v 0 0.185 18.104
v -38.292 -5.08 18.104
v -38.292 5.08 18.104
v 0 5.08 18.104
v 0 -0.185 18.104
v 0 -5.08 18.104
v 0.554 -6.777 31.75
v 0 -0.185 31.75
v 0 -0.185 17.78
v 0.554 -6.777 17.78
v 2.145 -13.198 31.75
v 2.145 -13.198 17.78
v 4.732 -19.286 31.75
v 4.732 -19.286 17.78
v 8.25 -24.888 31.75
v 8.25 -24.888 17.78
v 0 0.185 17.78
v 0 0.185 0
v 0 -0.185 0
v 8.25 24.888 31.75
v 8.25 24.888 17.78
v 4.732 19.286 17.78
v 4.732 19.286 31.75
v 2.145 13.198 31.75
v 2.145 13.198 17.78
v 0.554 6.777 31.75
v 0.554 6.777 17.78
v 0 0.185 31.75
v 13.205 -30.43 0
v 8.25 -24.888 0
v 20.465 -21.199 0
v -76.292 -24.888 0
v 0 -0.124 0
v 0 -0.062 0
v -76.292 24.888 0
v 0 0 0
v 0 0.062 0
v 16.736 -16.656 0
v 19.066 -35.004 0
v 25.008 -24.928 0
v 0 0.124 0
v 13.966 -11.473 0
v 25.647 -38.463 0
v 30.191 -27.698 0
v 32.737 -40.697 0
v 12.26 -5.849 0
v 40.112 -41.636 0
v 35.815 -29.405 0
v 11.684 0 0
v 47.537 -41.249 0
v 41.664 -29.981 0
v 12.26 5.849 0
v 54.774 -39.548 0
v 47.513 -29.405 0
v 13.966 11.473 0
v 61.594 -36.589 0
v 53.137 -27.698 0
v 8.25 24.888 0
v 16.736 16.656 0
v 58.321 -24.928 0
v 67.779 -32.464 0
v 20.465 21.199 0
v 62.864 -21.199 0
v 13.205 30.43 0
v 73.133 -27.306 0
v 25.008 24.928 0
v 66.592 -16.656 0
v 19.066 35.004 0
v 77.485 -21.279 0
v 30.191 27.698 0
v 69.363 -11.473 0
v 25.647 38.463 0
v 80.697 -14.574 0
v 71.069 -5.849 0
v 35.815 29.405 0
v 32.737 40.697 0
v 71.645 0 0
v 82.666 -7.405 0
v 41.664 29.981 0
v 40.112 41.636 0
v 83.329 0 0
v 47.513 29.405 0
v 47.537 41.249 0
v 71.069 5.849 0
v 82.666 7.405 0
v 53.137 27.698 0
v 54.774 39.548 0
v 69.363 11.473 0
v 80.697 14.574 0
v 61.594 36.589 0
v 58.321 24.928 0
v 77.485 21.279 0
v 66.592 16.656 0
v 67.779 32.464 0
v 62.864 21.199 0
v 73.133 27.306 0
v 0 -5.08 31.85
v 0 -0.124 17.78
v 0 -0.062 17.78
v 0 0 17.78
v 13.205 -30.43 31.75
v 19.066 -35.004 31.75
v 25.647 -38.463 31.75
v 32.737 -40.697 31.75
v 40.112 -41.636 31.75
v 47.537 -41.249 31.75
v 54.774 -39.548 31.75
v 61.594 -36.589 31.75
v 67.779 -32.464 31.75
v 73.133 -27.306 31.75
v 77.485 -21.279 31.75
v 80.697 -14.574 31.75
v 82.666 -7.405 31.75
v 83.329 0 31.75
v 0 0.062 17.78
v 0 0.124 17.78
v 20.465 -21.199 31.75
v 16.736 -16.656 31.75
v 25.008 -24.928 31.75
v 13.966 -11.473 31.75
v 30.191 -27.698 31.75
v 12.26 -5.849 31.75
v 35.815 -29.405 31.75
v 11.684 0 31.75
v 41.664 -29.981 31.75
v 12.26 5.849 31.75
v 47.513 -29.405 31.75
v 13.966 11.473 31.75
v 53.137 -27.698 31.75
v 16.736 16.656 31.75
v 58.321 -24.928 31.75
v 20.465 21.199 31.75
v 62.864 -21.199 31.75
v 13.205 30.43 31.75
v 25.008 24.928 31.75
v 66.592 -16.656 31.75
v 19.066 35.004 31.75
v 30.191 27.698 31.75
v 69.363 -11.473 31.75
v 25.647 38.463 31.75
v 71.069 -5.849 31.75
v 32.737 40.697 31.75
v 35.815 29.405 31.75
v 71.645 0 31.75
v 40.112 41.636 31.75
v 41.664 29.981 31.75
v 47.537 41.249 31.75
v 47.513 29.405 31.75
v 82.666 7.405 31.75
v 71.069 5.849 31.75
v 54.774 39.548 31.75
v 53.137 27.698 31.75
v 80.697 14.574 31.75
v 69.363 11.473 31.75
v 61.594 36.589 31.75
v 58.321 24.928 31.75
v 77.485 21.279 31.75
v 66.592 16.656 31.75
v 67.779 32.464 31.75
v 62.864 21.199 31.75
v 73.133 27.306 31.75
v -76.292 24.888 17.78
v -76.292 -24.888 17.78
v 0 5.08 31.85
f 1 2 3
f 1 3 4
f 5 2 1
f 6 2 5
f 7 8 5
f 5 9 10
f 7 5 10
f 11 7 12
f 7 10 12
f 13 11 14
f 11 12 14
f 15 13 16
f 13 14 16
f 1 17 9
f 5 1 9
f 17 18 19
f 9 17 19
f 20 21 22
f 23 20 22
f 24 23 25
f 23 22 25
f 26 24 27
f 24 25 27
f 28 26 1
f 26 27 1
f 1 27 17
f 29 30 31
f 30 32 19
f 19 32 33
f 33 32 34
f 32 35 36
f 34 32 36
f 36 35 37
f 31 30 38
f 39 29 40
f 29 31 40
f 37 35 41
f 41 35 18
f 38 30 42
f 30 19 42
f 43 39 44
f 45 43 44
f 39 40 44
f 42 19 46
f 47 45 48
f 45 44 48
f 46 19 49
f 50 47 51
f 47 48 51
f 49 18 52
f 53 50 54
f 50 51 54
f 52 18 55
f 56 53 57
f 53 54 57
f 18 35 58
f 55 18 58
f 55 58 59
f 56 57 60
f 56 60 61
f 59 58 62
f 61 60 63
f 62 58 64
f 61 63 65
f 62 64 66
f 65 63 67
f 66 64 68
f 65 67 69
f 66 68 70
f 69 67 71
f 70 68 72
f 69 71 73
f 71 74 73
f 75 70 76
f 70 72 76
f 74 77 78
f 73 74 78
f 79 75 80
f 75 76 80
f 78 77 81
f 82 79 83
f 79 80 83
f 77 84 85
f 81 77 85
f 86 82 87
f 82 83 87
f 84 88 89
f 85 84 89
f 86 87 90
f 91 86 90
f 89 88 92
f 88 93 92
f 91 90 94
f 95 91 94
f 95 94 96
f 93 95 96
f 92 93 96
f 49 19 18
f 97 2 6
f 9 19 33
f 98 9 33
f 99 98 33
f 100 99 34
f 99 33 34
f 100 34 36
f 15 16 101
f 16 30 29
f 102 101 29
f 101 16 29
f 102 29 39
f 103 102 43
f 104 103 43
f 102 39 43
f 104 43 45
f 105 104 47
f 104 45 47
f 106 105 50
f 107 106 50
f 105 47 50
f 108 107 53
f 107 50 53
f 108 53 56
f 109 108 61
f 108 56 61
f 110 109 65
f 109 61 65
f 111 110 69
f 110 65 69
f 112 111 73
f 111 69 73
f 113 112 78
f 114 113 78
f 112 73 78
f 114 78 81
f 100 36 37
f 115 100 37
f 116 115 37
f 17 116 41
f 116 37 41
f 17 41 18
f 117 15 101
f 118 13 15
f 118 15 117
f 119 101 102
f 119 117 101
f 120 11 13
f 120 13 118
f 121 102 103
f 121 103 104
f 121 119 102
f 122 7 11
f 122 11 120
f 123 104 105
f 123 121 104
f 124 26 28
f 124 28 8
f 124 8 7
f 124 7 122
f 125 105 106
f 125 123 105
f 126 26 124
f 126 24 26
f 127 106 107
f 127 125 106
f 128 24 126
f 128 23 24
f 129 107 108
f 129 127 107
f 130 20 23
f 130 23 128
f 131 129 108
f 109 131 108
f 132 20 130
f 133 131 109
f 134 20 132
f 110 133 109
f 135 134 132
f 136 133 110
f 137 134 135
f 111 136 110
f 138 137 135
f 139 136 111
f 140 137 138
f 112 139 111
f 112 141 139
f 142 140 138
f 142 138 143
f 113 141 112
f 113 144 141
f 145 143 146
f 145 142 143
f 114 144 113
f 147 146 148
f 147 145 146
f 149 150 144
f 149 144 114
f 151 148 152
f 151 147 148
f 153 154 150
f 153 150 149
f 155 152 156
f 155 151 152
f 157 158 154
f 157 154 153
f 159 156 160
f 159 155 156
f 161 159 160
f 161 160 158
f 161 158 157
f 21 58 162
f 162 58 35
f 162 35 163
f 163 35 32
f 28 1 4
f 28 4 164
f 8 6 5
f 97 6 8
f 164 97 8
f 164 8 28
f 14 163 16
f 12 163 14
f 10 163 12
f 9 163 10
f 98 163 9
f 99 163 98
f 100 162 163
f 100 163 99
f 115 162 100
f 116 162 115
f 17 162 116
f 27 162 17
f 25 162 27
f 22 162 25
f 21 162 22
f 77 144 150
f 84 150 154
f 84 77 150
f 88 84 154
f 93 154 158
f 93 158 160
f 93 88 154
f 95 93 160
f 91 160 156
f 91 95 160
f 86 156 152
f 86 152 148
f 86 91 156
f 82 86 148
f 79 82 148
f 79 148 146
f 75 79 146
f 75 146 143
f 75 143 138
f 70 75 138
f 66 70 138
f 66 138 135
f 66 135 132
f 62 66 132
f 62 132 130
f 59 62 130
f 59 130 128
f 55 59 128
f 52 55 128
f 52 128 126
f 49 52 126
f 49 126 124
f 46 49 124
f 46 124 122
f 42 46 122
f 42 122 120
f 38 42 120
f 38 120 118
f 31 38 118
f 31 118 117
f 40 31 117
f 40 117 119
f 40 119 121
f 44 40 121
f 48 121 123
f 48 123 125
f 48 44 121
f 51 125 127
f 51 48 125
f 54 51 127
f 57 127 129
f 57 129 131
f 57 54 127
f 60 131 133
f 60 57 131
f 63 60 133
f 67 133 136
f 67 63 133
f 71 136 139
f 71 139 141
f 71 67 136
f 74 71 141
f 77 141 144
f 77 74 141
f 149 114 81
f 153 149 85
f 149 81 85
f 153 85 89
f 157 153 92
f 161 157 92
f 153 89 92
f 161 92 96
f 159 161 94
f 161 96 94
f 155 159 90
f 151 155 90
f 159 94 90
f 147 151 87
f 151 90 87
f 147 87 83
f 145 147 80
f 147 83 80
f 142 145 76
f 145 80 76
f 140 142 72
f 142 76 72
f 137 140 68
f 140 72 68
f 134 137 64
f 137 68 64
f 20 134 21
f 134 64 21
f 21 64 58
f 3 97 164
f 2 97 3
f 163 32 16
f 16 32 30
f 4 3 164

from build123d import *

# Parameters (mm, degrees)
F0_R     = 29.980607
F1_DEPTH = 31.75
F2_DEPTH = 17.78
F4_DEPTH = 5.08


with BuildPart() as f1:
    # F0 (on Top) → F1 (new body)
    with BuildSketch(Plane.XY):
        with BuildLine():
            ThreePointArc((8.249651, -24.887905), (54.774032, -39.548346), (83.328802, 0))
            ThreePointArc((83.328802, 0), (54.774032, 39.548346), (8.249651, 24.887905))
            ThreePointArc((8.249651, 24.887905), (2.145128, 13.197838), (0, 0.185486))
            Line((0, 0.185486), (0, 0))
            Line((0, 0), (0, -0.185486))
            ThreePointArc((0, -0.185486), (2.145128, -13.197838), (8.249651, -24.887905))
        make_face()
        with Locations((41.664194, 0)):
            Circle(F0_R, mode=Mode.SUBTRACT)
    extrude(amount=F1_DEPTH)

    # F0 (on Top) → F2 (join)
    with BuildSketch(Plane.XY):
        with BuildLine():
            ThreePointArc((8.249651, -24.887905), (54.774032, -39.548346), (83.328802, 0))
            ThreePointArc((83.328802, 0), (54.774032, 39.548346), (8.249651, 24.887905))
            ThreePointArc((8.249651, 24.887905), (2.145128, 13.197838), (0, 0.185486))
            Line((0, 0.185486), (0, 0))
            Line((0, 0), (0, -0.185486))
            ThreePointArc((0, -0.185486), (2.145128, -13.197838), (8.249651, -24.887905))
        make_face()
        with Locations((41.664194, 0)):
            Circle(F0_R, mode=Mode.SUBTRACT)
        with BuildLine():
            ThreePointArc((0, 0.185486), (2.145128, 13.197838), (8.249651, 24.887905))
            Line((8.249651, 24.887905), (0, 24.887905))
            Line((0, 24.887905), (0, 0.185486))
        make_face()
        with BuildLine():
            Line((0, -24.887905), (8.249651, -24.887905))
            ThreePointArc((8.249651, -24.887905), (2.145128, -13.197838), (0, -0.185486))
            Line((0, -0.185486), (0, -24.887905))
        make_face()
        with BuildLine():
            ThreePointArc((-0.000413, 0), (-0.00031, 0.092743), (0, 0.185486))
            Line((0, 0.185486), (0, 24.887905))
            Line((0, 24.887905), (-76.291874, 24.887905))
            Line((-76.291874, 24.887905), (-76.291874, 0))
            Line((-76.291874, 0), (-0.000413, 0))
        make_face()
        with BuildLine():
            Line((0, -24.887905), (0, -0.185486))
            ThreePointArc((0, -0.185486), (-0.00031, -0.092743), (-0.000413, 0))
            Line((-0.000413, 0), (-76.291874, 0))
            Line((-76.291874, 0), (-76.291874, -24.887905))
            Line((-76.291874, -24.887905), (0, -24.887905))
        make_face()
    extrude(amount=F2_DEPTH)

    # F3 (on Front) → F4 (join, symmetric)
    with BuildSketch(Plane.XZ):
        Polygon((0, 31.850059), (-38.292281, 18.104225), (0, 18.104225), align=None)
    extrude(amount=F4_DEPTH, both=True)


solid = f1.part
